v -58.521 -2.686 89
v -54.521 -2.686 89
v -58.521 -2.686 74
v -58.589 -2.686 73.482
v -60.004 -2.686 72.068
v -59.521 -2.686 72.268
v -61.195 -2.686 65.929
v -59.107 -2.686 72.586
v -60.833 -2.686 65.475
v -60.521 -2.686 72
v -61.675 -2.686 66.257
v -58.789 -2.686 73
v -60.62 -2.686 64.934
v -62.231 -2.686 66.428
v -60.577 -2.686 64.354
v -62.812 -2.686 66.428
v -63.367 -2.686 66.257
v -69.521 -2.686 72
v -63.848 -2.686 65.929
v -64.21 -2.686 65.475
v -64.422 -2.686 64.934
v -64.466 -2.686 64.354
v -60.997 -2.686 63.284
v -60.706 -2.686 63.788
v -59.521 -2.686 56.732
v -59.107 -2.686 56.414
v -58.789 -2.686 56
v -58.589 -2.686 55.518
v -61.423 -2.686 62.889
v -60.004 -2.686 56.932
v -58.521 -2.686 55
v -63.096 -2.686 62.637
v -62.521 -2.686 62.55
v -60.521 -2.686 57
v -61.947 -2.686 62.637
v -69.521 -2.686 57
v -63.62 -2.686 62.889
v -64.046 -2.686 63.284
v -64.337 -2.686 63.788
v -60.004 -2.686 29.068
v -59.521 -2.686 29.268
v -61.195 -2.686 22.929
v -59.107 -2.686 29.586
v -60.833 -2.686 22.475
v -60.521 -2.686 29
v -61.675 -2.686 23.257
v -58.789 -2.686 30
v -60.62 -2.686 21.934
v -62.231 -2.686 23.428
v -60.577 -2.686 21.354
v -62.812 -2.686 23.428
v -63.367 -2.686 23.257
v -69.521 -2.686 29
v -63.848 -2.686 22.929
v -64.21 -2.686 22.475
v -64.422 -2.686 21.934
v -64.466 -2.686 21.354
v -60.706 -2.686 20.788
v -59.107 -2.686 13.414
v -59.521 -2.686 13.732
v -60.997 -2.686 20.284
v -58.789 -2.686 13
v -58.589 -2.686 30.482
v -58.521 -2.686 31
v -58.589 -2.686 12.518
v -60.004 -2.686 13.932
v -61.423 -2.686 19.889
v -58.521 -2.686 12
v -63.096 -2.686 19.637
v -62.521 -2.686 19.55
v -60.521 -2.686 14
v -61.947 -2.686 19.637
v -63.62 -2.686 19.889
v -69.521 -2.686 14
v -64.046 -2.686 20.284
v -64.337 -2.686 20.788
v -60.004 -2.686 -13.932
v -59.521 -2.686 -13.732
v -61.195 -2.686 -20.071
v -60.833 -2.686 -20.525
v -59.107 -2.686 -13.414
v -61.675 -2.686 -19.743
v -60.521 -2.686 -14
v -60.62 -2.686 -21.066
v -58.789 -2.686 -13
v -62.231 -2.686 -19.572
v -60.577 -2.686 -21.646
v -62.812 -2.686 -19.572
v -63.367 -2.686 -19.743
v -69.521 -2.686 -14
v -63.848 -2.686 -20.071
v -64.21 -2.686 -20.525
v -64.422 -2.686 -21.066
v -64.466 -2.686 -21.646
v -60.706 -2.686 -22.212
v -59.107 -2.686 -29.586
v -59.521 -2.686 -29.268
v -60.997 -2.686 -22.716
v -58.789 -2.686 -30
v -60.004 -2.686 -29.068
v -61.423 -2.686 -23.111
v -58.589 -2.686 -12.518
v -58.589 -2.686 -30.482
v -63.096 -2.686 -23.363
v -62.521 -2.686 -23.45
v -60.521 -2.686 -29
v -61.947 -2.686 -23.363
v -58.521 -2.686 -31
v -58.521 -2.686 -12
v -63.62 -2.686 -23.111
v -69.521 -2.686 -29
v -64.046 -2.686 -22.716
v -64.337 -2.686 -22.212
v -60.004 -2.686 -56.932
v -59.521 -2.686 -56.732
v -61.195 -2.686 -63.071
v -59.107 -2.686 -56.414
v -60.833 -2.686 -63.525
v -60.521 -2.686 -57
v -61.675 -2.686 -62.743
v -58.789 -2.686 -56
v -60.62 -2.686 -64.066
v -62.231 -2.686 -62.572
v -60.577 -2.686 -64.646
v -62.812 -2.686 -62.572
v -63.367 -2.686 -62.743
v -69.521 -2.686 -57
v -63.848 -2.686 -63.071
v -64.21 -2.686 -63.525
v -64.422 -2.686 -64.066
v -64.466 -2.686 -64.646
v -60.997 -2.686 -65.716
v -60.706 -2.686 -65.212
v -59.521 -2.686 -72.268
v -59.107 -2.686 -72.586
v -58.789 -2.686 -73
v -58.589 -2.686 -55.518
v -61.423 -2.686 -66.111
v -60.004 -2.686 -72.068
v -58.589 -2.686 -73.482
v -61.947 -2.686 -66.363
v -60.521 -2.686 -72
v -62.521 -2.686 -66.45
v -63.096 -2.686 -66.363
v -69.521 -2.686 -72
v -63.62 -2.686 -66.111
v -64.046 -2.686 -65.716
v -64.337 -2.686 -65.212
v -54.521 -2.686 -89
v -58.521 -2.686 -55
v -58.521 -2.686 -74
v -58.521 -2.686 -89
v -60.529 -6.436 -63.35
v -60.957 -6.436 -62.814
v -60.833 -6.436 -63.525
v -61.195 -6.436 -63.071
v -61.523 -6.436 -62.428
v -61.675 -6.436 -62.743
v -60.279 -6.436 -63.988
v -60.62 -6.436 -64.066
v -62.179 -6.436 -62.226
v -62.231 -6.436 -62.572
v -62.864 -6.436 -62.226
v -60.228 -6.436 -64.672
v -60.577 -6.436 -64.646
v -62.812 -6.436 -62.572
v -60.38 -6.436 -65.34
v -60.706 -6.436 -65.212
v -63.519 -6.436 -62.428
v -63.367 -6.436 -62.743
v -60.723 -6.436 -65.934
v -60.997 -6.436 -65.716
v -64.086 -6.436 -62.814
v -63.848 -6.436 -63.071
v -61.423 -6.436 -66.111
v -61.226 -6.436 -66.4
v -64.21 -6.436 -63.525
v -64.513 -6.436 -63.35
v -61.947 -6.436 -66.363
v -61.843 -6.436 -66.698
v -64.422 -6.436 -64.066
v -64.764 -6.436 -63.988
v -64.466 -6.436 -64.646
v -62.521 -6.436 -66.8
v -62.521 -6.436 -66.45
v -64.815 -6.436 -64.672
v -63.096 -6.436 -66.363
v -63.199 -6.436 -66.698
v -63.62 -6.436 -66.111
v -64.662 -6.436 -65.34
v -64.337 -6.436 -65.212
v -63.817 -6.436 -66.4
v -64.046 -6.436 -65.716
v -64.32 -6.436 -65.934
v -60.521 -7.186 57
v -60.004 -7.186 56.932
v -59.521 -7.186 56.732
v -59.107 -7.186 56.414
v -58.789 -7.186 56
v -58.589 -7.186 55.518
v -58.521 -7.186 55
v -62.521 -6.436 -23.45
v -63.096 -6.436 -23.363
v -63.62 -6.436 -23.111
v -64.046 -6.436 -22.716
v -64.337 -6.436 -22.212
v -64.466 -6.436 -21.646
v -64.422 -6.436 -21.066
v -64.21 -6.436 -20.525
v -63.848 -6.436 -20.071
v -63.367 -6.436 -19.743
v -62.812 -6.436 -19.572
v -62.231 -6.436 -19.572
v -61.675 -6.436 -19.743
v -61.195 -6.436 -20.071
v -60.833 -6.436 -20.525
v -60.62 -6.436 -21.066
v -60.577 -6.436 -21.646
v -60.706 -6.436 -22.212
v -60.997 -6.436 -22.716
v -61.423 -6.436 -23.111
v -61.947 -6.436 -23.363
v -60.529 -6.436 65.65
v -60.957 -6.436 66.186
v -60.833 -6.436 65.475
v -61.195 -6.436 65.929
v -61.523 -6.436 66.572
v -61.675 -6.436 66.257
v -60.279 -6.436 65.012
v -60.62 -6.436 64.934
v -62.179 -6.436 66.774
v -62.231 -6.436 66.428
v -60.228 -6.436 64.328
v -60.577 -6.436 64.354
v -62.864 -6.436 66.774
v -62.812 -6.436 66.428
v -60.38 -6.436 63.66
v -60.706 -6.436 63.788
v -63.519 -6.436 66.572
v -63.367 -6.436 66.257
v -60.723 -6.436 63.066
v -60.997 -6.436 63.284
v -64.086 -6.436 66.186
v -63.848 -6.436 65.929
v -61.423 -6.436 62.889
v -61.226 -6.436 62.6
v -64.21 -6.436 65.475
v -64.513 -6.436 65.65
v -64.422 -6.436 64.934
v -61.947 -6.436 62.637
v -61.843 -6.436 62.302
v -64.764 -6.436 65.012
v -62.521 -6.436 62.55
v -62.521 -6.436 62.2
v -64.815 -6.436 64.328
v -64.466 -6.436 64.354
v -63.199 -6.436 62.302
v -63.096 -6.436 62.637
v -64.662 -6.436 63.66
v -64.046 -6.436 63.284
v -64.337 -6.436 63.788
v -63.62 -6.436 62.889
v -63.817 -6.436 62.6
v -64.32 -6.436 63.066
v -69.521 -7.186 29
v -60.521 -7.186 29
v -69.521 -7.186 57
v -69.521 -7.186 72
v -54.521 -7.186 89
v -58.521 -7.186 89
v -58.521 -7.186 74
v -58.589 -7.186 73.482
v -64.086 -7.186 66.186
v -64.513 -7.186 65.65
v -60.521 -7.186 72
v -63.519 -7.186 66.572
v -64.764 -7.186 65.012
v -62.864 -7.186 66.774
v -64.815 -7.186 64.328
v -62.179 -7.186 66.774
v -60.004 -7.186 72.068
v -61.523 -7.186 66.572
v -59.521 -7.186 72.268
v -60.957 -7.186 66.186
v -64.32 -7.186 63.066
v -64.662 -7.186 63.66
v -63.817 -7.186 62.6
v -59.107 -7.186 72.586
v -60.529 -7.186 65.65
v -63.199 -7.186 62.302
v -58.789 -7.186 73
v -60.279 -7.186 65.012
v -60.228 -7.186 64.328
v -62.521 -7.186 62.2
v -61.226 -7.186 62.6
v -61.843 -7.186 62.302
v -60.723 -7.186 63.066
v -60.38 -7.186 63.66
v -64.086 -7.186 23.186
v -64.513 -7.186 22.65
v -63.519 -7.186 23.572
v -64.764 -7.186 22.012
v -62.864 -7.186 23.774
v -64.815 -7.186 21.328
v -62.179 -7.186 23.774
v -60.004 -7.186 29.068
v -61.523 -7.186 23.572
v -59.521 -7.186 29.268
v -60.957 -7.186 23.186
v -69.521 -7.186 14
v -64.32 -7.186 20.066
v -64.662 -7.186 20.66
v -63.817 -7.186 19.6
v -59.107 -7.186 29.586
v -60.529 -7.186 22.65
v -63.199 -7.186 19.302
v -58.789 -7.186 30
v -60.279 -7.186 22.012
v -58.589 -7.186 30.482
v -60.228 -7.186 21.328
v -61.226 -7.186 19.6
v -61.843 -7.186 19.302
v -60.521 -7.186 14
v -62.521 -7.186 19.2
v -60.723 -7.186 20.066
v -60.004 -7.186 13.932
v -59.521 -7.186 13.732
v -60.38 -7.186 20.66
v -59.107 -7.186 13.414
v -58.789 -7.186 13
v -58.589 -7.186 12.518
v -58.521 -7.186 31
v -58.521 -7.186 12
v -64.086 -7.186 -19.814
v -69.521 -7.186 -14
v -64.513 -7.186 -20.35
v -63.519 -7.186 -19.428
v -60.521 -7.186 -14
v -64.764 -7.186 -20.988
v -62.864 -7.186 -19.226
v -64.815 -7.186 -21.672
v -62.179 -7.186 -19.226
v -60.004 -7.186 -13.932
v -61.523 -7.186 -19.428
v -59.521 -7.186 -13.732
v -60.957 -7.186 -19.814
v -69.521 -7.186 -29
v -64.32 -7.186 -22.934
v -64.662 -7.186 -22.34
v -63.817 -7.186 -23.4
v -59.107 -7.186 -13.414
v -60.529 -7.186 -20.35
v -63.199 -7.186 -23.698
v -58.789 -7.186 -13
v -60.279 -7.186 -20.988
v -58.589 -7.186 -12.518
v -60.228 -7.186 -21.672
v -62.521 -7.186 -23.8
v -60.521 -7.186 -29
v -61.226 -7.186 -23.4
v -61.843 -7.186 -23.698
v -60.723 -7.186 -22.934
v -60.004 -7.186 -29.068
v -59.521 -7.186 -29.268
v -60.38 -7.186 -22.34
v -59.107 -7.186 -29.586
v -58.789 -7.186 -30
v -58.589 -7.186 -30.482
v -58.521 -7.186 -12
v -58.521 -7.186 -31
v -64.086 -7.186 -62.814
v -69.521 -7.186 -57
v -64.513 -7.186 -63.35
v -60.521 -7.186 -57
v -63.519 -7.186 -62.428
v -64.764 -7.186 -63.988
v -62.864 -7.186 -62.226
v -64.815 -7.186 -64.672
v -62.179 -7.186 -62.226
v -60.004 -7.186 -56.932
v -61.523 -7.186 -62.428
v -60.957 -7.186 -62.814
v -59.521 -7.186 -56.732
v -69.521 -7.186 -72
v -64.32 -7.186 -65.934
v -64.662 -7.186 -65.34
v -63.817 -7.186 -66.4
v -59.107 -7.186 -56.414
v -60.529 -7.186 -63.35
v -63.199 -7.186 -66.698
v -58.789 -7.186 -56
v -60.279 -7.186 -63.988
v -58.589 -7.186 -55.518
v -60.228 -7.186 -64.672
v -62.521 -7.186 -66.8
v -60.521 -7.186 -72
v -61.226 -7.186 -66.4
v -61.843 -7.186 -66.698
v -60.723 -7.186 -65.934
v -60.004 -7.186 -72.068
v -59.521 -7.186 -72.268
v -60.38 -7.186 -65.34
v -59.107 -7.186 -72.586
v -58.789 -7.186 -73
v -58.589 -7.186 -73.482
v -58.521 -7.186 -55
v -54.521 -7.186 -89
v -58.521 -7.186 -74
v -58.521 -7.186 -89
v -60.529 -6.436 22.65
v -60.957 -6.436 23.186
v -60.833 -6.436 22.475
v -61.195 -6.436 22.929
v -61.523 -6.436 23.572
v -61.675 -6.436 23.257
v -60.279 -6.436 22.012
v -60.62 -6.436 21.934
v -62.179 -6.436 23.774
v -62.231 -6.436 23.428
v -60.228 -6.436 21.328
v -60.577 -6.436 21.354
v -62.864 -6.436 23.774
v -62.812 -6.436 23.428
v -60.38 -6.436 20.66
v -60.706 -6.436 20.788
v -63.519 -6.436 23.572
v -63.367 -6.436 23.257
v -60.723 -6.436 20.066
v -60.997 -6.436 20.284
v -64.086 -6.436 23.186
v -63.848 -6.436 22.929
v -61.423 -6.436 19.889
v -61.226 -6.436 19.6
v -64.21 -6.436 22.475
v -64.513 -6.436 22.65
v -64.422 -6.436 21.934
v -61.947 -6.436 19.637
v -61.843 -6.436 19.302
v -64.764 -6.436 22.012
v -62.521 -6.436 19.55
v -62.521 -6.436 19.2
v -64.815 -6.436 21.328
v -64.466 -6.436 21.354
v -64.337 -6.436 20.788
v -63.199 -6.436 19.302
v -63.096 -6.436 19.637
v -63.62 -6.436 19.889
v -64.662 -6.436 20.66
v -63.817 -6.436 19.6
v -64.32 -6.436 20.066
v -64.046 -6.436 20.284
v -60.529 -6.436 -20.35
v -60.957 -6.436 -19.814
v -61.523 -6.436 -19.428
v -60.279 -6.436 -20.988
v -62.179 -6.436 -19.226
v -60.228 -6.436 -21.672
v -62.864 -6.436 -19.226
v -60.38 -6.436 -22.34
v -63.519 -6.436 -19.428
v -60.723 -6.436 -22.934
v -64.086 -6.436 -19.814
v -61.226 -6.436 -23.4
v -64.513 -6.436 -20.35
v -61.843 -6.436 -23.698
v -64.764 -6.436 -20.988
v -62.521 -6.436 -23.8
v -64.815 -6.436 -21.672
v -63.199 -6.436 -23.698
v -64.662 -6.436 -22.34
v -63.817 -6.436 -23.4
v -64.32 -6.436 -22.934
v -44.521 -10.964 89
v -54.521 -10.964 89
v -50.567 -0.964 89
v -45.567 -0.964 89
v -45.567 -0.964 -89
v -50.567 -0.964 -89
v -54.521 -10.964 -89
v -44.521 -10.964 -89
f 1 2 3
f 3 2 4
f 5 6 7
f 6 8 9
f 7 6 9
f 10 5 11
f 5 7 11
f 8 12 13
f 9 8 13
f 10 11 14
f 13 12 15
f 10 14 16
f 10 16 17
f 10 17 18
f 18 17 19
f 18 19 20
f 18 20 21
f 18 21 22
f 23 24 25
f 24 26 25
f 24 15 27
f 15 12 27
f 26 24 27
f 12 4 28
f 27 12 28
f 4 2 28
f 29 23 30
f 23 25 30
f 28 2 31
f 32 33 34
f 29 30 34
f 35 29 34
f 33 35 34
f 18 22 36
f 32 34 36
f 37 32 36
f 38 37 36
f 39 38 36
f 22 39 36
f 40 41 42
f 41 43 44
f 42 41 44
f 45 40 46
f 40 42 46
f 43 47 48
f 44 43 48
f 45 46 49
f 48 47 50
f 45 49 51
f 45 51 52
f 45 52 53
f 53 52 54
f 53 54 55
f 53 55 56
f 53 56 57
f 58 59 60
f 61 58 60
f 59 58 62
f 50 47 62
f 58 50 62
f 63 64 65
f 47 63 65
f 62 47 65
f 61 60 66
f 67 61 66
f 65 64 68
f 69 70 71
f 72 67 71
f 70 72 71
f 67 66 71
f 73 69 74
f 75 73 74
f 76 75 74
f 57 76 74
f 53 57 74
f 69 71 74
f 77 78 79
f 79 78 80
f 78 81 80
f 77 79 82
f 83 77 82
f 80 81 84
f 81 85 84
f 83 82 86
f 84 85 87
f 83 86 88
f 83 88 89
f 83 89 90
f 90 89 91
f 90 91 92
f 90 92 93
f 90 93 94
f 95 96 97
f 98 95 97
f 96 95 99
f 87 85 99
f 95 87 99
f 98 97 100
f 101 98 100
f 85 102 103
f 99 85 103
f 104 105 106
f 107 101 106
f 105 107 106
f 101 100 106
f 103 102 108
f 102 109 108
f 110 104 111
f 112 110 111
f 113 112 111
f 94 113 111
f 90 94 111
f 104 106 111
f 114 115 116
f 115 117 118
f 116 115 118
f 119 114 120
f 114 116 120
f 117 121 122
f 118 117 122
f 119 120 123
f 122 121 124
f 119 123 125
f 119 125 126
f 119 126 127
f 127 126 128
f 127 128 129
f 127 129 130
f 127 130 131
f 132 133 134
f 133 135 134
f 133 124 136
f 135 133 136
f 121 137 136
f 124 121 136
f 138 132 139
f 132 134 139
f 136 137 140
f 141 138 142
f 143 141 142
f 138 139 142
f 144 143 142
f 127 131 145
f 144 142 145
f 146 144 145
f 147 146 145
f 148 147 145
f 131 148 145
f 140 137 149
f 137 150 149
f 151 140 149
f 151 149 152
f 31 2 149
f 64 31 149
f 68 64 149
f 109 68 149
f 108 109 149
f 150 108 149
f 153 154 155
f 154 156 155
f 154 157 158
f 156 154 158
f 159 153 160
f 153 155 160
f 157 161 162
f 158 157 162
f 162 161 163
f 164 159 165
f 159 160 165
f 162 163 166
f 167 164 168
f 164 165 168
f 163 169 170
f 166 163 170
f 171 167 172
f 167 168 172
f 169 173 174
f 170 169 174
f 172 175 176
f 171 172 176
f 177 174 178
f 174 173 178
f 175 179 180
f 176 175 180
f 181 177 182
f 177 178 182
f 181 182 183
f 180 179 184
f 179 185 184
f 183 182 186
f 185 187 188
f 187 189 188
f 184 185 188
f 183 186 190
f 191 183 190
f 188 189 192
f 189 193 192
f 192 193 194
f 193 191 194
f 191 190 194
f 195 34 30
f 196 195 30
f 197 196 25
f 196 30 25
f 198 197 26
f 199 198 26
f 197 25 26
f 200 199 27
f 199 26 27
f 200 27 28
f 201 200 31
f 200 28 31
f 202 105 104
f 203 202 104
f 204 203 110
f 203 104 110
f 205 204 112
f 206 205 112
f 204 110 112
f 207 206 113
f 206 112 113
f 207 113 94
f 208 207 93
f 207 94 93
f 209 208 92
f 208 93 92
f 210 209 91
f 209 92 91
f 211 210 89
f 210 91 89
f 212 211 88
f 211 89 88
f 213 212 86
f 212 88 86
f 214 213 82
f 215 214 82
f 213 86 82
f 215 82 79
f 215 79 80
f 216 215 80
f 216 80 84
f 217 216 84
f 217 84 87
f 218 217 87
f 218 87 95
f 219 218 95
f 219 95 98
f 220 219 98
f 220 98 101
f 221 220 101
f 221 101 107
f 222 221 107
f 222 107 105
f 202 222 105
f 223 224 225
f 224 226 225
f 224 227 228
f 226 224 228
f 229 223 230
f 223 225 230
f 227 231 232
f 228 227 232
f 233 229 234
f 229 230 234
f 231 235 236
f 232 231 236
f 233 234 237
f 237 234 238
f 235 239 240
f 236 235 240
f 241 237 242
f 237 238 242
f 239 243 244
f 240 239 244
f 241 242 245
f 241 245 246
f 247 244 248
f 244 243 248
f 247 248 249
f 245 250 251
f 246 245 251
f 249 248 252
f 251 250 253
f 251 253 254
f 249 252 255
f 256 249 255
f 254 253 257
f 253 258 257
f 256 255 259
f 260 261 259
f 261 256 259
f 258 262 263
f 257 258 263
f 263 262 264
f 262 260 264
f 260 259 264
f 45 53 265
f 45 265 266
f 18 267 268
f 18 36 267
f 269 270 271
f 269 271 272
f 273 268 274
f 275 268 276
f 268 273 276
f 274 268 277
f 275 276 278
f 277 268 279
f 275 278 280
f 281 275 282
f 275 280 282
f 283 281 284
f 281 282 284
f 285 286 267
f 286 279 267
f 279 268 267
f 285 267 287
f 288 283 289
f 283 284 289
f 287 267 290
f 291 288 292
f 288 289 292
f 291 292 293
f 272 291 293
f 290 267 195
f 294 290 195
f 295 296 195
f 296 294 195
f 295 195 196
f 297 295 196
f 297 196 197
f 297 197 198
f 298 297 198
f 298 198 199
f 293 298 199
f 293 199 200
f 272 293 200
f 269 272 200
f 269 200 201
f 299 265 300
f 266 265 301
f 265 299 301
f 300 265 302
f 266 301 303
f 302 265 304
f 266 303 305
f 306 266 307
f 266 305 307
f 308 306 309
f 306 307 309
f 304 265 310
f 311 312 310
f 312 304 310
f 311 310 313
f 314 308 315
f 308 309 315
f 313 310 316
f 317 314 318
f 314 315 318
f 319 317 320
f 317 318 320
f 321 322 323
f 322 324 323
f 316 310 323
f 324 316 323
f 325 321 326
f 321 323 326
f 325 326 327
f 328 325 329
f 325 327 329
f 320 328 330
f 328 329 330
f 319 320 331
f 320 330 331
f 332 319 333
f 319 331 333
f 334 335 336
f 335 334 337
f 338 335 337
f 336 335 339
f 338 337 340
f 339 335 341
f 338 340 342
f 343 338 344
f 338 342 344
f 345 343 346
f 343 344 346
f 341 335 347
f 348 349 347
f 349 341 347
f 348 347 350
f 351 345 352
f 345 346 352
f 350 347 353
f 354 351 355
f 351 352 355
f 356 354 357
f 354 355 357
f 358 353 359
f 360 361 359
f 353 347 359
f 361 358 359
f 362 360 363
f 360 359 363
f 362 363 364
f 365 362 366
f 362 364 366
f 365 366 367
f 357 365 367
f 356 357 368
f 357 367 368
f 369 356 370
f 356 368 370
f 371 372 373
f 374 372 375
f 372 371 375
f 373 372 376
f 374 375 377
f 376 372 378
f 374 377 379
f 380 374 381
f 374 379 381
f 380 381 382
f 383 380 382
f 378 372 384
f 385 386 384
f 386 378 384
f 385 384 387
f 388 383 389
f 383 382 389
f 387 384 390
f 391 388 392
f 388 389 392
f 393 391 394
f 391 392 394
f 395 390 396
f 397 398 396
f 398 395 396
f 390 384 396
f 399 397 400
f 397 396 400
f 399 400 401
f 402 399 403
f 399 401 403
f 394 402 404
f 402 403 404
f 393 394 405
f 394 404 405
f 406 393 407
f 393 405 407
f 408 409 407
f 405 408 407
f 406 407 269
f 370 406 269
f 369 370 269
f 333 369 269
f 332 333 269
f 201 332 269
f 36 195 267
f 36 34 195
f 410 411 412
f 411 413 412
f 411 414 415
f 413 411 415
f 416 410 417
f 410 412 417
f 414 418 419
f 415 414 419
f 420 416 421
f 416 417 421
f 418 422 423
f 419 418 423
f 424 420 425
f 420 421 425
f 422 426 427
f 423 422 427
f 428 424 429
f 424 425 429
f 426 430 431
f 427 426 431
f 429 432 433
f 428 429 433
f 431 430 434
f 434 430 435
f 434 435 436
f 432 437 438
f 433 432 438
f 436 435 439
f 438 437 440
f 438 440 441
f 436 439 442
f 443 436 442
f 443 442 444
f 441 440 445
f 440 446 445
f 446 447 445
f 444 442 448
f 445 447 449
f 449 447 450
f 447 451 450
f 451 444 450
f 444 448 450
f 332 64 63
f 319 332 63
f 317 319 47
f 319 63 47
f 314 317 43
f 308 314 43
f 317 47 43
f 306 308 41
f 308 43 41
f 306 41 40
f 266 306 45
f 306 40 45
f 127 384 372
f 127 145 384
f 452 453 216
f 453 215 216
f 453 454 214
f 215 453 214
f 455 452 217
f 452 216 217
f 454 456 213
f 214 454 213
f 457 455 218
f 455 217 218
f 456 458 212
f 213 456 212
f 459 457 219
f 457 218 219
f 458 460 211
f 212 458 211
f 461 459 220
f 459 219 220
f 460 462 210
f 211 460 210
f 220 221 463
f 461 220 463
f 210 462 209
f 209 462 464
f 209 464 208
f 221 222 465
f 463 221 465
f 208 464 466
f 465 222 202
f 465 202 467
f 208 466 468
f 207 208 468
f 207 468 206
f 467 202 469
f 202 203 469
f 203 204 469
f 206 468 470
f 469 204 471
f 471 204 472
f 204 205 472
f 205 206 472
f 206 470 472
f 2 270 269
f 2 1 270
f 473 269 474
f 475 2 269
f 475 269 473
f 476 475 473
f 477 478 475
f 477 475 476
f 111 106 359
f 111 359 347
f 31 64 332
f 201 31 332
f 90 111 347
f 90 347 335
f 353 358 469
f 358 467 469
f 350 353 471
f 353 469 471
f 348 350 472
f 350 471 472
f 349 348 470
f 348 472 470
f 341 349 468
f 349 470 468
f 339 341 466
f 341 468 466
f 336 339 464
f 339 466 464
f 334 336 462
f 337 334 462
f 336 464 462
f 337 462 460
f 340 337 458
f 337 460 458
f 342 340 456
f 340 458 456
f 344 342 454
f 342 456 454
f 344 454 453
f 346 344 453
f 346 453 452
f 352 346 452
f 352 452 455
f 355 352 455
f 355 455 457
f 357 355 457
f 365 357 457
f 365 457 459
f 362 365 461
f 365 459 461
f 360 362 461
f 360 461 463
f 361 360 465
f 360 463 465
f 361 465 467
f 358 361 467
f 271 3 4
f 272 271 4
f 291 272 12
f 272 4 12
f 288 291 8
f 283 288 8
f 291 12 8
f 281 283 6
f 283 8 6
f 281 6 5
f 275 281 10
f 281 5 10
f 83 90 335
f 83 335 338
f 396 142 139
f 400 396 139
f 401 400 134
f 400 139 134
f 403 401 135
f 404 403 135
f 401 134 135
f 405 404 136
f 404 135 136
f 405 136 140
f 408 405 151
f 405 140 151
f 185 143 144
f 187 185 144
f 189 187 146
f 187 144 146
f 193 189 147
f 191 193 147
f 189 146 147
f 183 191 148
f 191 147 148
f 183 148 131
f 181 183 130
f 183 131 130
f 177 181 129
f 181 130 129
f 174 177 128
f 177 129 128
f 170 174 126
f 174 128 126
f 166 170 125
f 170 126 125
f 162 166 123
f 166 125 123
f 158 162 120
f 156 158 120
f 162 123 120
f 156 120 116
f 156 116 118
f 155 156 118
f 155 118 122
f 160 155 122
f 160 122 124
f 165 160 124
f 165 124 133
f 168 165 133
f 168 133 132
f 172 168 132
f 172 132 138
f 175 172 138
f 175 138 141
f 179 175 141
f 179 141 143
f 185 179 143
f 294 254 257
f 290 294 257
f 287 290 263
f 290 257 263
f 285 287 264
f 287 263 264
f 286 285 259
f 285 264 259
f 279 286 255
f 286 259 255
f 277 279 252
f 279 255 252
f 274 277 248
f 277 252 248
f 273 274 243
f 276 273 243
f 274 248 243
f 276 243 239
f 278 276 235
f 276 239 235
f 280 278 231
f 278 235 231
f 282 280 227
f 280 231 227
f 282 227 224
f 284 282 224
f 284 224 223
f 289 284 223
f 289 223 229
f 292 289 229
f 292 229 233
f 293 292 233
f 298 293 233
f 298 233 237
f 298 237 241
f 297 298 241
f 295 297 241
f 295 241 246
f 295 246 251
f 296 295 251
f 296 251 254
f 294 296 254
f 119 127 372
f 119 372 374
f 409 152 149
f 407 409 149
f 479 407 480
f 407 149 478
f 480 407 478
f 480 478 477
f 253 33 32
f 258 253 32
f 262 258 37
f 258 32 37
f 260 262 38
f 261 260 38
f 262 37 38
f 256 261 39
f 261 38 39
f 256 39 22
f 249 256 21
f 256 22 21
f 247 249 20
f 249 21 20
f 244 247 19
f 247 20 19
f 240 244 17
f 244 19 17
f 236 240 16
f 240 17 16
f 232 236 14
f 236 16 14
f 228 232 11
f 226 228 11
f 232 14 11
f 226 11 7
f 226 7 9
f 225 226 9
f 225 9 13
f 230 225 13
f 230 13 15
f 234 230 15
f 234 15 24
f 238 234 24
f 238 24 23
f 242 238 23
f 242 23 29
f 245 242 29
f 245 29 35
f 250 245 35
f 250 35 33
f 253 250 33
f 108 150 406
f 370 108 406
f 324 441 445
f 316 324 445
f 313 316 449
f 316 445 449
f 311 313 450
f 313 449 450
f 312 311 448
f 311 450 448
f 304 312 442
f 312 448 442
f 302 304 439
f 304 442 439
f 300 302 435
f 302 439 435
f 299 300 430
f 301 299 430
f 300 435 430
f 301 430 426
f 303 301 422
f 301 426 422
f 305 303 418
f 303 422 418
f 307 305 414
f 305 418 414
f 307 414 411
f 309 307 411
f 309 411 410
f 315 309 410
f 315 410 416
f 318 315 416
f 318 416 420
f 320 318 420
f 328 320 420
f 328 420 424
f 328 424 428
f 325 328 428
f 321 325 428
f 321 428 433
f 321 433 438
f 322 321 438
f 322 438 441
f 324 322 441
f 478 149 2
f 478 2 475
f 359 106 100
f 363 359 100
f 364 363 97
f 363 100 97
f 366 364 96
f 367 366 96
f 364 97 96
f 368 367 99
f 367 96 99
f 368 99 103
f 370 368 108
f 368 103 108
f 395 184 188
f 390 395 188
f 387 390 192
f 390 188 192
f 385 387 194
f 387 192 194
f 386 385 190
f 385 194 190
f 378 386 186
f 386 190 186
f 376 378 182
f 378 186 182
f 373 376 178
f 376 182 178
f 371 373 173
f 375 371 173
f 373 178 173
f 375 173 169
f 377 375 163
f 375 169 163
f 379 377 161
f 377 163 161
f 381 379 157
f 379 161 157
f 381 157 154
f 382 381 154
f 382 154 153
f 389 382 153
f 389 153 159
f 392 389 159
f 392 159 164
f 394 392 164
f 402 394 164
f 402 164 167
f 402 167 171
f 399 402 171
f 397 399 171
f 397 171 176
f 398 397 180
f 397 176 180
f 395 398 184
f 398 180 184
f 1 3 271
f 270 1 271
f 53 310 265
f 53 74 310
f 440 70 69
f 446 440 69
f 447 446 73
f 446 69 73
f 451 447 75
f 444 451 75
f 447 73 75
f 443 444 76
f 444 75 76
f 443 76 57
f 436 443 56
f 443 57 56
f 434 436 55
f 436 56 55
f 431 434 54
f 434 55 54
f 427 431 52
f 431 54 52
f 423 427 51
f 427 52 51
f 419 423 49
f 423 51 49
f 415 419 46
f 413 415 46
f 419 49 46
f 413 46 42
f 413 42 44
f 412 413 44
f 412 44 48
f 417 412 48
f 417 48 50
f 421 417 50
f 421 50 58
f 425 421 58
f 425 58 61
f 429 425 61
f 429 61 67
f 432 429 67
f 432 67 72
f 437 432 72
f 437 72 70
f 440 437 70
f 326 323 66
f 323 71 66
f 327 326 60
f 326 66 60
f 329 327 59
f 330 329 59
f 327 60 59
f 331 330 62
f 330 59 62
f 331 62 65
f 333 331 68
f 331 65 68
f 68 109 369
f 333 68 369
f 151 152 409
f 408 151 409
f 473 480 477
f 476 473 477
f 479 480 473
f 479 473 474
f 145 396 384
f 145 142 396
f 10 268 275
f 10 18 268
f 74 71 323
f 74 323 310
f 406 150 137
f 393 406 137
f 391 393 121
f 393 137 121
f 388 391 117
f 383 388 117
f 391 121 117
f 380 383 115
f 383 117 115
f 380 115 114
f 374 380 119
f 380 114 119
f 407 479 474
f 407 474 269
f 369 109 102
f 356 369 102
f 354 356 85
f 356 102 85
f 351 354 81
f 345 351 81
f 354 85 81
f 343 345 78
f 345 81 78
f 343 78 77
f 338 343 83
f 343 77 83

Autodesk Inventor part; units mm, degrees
ref_plane "YZ Plane" through (0, 0, 0) normal (1, 0, 0) x (0, 1, 0)
ref_plane "XZ Plane" through (0, 0, 0) normal (0, 1, 0) x (-1, 0, 0)
sketch "Sketch1" plane through (0, 0, 0) normal (0, 0, 1) x (1, 0, 0)
  line L0 (-60.5213, -2.6863) -> (-60.5213, -7.1863) projected
  line L1 (-69.5213, -2.6863) -> (-60.5213, -2.6863) projected
  line L2 (-69.5213, -7.1863) -> (-69.5213, -2.6863) projected
  line L3 (-60.5213, -7.1863) -> (-69.5213, -7.1863) projected
  line L4 (-60.5213, -7.1863) -> (-58.5213, -7.1863) projected
  line L5 (-58.5213, -2.6863) -> (-60.5213, -2.6863) projected
  line L6 (-58.5213, -10.6863) -> (-54.5213, -10.6863) projected
  line L7 (-54.5213, -10.6863) -> (-54.5213, -7.1863) projected
  line L8 (-58.5213, -7.1863) -> (-54.5213, -7.1863) projected
  line L9 (-58.5213, -10.6863) -> (-58.5213, -7.1863) projected
  line L10 (-58.5213, -2.6863) -> (-58.5213, -7.1863) projected
  line L11 (-58.5213, -7.1863) -> (-54.5213, -7.1863) projected
  line L12 (-54.5213, -7.1863) -> (-54.5213, -10.6863) projected
  line L13 (-54.5213, -10.6863) -> (-40.5213, -10.6863) projected
  line L14 (-40.5213, -10.6863) -> (-54.5213, -1.6863) projected
  line L15 (-54.5213, -1.6863) -> (-54.5213, -2.6863) projected
  line L16 (-54.5213, -2.6863) -> (-58.5213, -2.6863) projected
  line L17 (-58.5213, -0.9637) -> (-44.5213, -0.9637)
  line L18 (-44.5213, -0.9637) -> (-44.5213, -10.9637)
  line L19 (-44.5213, -10.9637) -> (-58.5213, -10.9637)
  line L20 (-58.5213, -10.9637) -> (-58.5213, -0.9637)
  line L21 (-69.5213, -2.6863) -> (-58.5213, -2.6863)
  line L22 (-58.5213, -2.6863) -> (-58.5213, -7.1863)
  line L23 (-58.5213, -7.1863) -> (-69.5213, -7.1863)
  line L24 (-69.5213, -7.1863) -> (-69.5213, -2.6863)
  circle A0 centre (-213.5213, 2.3137) radius 25 projected
  line L25 (-213.5213, -22.6863) -> (-44.5213, -10.9637)
  line L26 (-213.5213, -22.6863) -> (-213.5213, 2.3137)
  line L27 (-44.5213, -10.9637) -> (-40.5213, -10.6863)
  line L28 (-44.5213, -10.9637) -> (-45.5667, -0.9637)
  line L29 (-58.5213, -2.6863) -> (-54.5213, -2.6863)
  line L30 (-54.5213, -2.6863) -> (-54.5213, -0.9637)
  line L31 (-54.5213, -0.9637) -> (-58.5213, -0.9637)
  line L32 (-58.5213, -0.9637) -> (-58.5213, -2.6863)
  line L33 (-54.5213, -2.6863) -> (-50.5667, -0.9637)
  line L34 (-54.5213, -10.6863) -> (-54.5213, -10.9637)
  point P0 (0, 0)
  point P1 (-53.594, -2.2824)
  point P2 (-44.5503, -10.6863)
  dimension "d0" = 14
  dimension "d1" = 10
  dimension "d3" = 88
  dimension "d15" = 5
  dimension "d16" = 23.537
extrude "Extrusion1" add sketch "Sketch1" along normal mid plane 178 contours L16 L33 L14 L28 L13 L7 L8 L10 | L33 L17 L28 L14 | L13 L28 L19 L34
sketch "Sketch2" plane through (-58.5213, -2.6863, 89) normal (0, 1, 0) x (1, 0, 0)
  circle A0 centre (-4, 67.5) radius 1.2295 projected
  circle A1 centre (-4, 153.5) radius 1.2295 projected
  circle A2 centre (-4, 110.5) radius 1.2295 projected
  circle A3 centre (-4, 24.5) radius 1.2295 projected
  line L0 (-2, 161) -> (-11, 161) projected
  line L1 (-11, 161) -> (-11, 146) projected
  line L2 (-11, 146) -> (-2, 146) projected
  arc A4 (0, 144) -> (-2, 146) centre (-2, 144) ccw projected
  line L3 (0, 144) -> (0, 120) projected
  arc A5 (-2, 118) -> (0, 120) centre (-2, 120) ccw projected
  line L4 (-2, 118) -> (-11, 118) projected
  line L5 (-11, 118) -> (-11, 103) projected
  line L6 (-11, 103) -> (-2, 103) projected
  arc A6 (0, 101) -> (-2, 103) centre (-2, 101) ccw projected
  line L7 (0, 101) -> (0, 77) projected
  arc A7 (-2, 75) -> (0, 77) centre (-2, 77) ccw projected
  line L8 (-2, 75) -> (-11, 75) projected
  line L9 (-11, 75) -> (-11, 60) projected
  line L10 (-11, 60) -> (-2, 60) projected
  arc A8 (0, 58) -> (-2, 60) centre (-2, 58) ccw projected
  line L11 (0, 58) -> (0, 34) projected
  arc A9 (-2, 32) -> (0, 34) centre (-2, 34) ccw projected
  line L12 (-2, 32) -> (-11, 32) projected
  line L13 (-11, 32) -> (-11, 17) projected
  line L14 (-11, 17) -> (-2, 17) projected
  arc A10 (0, 15) -> (-2, 17) centre (-2, 15) ccw projected
  line L15 (0, 15) -> (0, 0) projected
  line L16 (4, 0) -> (0, 0) projected
  line L17 (4, 178) -> (4, 0) projected
  line L18 (4, 178) -> (0, 178) projected
  line L19 (0, 178) -> (0, 163) projected
  arc A11 (-2, 161) -> (0, 163) centre (-2, 163) ccw projected
  line L20 (0, 178) -> (0, 0) projected
  point P0 (58.5213, 89)
ref_plane "Work Plane1" through (-69.5213, -7.1863, -89) normal (0, -1, 0) x (1, 0, 0)
extrude "Extrusion2" add sketch "Sketch2" against normal up to surface (4.5 mm away) contours A0 | A1 | A2 | A3 | A11 L20 A4 L2 L1 L0 | L20 A6 L6 L5 L4 A5 | L20 A8 L10 L9 L8 A7 | A10 L14 L13 L12 A9 L20
sketch "Sketch3" plane through (-69.5213, -7.1863, -57) normal (0, -1, 0) x (1, 0, 0)
  circle A0 centre (7, 78.5) radius 1.2295 projected
  circle A1 centre (7, -7.5) radius 1.2295 projected
  circle A2 centre (7, 35.5) radius 1.2295 projected
  circle A3 centre (7, 121.5) radius 1.2295 projected
  line L0 (9, -15) -> (0, -15) projected
  line L1 (0, -15) -> (0, 0) projected
  line L2 (0, 0) -> (9, 0) projected
  arc A4 (9, 0) -> (11, 2) centre (9, 2) ccw projected
  line L3 (11, 2) -> (11, 26) projected
  arc A5 (11, 26) -> (9, 28) centre (9, 26) ccw projected
  line L4 (9, 28) -> (0, 28) projected
  line L5 (0, 28) -> (0, 43) projected
  line L6 (0, 43) -> (9, 43) projected
  arc A6 (9, 43) -> (11, 45) centre (9, 45) ccw projected
  line L7 (11, 45) -> (11, 69) projected
  arc A7 (11, 69) -> (9, 71) centre (9, 69) ccw projected
  line L8 (9, 71) -> (0, 71) projected
  line L9 (0, 71) -> (0, 86) projected
  line L10 (0, 86) -> (9, 86) projected
  arc A8 (9, 86) -> (11, 88) centre (9, 88) ccw projected
  line L11 (11, 88) -> (11, 112) projected
  arc A9 (11, 112) -> (9, 114) centre (9, 112) ccw projected
  line L12 (9, 114) -> (0, 114) projected
  line L13 (0, 114) -> (0, 129) projected
  line L14 (0, 129) -> (9, 129) projected
  arc A10 (9, 129) -> (11, 131) centre (9, 131) ccw projected
  line L15 (11, 131) -> (11, 146) projected
  line L16 (15, 146) -> (11, 146) projected
  line L17 (15, -32) -> (15, 146) projected
  line L18 (15, -32) -> (11, -32) projected
  line L19 (11, -32) -> (11, -17) projected
  arc A11 (11, -17) -> (9, -15) centre (9, -17) ccw projected
  point P0 (69.5213, 57)
hole "Hole1" at (-62.5213, -7.1863, -64.5) at (-62.5213, -7.1863, -21.5) at (-62.5213, -7.1863, 21.5) at (-62.5213, -7.1863, 64.5) direction (0, 1, 0) diameter 3.9 depth 4.5 counterbore diameter 4.6 counterbore depth 0.75
properties part number "plaski_plog" material "PC/ABS Plastic"
